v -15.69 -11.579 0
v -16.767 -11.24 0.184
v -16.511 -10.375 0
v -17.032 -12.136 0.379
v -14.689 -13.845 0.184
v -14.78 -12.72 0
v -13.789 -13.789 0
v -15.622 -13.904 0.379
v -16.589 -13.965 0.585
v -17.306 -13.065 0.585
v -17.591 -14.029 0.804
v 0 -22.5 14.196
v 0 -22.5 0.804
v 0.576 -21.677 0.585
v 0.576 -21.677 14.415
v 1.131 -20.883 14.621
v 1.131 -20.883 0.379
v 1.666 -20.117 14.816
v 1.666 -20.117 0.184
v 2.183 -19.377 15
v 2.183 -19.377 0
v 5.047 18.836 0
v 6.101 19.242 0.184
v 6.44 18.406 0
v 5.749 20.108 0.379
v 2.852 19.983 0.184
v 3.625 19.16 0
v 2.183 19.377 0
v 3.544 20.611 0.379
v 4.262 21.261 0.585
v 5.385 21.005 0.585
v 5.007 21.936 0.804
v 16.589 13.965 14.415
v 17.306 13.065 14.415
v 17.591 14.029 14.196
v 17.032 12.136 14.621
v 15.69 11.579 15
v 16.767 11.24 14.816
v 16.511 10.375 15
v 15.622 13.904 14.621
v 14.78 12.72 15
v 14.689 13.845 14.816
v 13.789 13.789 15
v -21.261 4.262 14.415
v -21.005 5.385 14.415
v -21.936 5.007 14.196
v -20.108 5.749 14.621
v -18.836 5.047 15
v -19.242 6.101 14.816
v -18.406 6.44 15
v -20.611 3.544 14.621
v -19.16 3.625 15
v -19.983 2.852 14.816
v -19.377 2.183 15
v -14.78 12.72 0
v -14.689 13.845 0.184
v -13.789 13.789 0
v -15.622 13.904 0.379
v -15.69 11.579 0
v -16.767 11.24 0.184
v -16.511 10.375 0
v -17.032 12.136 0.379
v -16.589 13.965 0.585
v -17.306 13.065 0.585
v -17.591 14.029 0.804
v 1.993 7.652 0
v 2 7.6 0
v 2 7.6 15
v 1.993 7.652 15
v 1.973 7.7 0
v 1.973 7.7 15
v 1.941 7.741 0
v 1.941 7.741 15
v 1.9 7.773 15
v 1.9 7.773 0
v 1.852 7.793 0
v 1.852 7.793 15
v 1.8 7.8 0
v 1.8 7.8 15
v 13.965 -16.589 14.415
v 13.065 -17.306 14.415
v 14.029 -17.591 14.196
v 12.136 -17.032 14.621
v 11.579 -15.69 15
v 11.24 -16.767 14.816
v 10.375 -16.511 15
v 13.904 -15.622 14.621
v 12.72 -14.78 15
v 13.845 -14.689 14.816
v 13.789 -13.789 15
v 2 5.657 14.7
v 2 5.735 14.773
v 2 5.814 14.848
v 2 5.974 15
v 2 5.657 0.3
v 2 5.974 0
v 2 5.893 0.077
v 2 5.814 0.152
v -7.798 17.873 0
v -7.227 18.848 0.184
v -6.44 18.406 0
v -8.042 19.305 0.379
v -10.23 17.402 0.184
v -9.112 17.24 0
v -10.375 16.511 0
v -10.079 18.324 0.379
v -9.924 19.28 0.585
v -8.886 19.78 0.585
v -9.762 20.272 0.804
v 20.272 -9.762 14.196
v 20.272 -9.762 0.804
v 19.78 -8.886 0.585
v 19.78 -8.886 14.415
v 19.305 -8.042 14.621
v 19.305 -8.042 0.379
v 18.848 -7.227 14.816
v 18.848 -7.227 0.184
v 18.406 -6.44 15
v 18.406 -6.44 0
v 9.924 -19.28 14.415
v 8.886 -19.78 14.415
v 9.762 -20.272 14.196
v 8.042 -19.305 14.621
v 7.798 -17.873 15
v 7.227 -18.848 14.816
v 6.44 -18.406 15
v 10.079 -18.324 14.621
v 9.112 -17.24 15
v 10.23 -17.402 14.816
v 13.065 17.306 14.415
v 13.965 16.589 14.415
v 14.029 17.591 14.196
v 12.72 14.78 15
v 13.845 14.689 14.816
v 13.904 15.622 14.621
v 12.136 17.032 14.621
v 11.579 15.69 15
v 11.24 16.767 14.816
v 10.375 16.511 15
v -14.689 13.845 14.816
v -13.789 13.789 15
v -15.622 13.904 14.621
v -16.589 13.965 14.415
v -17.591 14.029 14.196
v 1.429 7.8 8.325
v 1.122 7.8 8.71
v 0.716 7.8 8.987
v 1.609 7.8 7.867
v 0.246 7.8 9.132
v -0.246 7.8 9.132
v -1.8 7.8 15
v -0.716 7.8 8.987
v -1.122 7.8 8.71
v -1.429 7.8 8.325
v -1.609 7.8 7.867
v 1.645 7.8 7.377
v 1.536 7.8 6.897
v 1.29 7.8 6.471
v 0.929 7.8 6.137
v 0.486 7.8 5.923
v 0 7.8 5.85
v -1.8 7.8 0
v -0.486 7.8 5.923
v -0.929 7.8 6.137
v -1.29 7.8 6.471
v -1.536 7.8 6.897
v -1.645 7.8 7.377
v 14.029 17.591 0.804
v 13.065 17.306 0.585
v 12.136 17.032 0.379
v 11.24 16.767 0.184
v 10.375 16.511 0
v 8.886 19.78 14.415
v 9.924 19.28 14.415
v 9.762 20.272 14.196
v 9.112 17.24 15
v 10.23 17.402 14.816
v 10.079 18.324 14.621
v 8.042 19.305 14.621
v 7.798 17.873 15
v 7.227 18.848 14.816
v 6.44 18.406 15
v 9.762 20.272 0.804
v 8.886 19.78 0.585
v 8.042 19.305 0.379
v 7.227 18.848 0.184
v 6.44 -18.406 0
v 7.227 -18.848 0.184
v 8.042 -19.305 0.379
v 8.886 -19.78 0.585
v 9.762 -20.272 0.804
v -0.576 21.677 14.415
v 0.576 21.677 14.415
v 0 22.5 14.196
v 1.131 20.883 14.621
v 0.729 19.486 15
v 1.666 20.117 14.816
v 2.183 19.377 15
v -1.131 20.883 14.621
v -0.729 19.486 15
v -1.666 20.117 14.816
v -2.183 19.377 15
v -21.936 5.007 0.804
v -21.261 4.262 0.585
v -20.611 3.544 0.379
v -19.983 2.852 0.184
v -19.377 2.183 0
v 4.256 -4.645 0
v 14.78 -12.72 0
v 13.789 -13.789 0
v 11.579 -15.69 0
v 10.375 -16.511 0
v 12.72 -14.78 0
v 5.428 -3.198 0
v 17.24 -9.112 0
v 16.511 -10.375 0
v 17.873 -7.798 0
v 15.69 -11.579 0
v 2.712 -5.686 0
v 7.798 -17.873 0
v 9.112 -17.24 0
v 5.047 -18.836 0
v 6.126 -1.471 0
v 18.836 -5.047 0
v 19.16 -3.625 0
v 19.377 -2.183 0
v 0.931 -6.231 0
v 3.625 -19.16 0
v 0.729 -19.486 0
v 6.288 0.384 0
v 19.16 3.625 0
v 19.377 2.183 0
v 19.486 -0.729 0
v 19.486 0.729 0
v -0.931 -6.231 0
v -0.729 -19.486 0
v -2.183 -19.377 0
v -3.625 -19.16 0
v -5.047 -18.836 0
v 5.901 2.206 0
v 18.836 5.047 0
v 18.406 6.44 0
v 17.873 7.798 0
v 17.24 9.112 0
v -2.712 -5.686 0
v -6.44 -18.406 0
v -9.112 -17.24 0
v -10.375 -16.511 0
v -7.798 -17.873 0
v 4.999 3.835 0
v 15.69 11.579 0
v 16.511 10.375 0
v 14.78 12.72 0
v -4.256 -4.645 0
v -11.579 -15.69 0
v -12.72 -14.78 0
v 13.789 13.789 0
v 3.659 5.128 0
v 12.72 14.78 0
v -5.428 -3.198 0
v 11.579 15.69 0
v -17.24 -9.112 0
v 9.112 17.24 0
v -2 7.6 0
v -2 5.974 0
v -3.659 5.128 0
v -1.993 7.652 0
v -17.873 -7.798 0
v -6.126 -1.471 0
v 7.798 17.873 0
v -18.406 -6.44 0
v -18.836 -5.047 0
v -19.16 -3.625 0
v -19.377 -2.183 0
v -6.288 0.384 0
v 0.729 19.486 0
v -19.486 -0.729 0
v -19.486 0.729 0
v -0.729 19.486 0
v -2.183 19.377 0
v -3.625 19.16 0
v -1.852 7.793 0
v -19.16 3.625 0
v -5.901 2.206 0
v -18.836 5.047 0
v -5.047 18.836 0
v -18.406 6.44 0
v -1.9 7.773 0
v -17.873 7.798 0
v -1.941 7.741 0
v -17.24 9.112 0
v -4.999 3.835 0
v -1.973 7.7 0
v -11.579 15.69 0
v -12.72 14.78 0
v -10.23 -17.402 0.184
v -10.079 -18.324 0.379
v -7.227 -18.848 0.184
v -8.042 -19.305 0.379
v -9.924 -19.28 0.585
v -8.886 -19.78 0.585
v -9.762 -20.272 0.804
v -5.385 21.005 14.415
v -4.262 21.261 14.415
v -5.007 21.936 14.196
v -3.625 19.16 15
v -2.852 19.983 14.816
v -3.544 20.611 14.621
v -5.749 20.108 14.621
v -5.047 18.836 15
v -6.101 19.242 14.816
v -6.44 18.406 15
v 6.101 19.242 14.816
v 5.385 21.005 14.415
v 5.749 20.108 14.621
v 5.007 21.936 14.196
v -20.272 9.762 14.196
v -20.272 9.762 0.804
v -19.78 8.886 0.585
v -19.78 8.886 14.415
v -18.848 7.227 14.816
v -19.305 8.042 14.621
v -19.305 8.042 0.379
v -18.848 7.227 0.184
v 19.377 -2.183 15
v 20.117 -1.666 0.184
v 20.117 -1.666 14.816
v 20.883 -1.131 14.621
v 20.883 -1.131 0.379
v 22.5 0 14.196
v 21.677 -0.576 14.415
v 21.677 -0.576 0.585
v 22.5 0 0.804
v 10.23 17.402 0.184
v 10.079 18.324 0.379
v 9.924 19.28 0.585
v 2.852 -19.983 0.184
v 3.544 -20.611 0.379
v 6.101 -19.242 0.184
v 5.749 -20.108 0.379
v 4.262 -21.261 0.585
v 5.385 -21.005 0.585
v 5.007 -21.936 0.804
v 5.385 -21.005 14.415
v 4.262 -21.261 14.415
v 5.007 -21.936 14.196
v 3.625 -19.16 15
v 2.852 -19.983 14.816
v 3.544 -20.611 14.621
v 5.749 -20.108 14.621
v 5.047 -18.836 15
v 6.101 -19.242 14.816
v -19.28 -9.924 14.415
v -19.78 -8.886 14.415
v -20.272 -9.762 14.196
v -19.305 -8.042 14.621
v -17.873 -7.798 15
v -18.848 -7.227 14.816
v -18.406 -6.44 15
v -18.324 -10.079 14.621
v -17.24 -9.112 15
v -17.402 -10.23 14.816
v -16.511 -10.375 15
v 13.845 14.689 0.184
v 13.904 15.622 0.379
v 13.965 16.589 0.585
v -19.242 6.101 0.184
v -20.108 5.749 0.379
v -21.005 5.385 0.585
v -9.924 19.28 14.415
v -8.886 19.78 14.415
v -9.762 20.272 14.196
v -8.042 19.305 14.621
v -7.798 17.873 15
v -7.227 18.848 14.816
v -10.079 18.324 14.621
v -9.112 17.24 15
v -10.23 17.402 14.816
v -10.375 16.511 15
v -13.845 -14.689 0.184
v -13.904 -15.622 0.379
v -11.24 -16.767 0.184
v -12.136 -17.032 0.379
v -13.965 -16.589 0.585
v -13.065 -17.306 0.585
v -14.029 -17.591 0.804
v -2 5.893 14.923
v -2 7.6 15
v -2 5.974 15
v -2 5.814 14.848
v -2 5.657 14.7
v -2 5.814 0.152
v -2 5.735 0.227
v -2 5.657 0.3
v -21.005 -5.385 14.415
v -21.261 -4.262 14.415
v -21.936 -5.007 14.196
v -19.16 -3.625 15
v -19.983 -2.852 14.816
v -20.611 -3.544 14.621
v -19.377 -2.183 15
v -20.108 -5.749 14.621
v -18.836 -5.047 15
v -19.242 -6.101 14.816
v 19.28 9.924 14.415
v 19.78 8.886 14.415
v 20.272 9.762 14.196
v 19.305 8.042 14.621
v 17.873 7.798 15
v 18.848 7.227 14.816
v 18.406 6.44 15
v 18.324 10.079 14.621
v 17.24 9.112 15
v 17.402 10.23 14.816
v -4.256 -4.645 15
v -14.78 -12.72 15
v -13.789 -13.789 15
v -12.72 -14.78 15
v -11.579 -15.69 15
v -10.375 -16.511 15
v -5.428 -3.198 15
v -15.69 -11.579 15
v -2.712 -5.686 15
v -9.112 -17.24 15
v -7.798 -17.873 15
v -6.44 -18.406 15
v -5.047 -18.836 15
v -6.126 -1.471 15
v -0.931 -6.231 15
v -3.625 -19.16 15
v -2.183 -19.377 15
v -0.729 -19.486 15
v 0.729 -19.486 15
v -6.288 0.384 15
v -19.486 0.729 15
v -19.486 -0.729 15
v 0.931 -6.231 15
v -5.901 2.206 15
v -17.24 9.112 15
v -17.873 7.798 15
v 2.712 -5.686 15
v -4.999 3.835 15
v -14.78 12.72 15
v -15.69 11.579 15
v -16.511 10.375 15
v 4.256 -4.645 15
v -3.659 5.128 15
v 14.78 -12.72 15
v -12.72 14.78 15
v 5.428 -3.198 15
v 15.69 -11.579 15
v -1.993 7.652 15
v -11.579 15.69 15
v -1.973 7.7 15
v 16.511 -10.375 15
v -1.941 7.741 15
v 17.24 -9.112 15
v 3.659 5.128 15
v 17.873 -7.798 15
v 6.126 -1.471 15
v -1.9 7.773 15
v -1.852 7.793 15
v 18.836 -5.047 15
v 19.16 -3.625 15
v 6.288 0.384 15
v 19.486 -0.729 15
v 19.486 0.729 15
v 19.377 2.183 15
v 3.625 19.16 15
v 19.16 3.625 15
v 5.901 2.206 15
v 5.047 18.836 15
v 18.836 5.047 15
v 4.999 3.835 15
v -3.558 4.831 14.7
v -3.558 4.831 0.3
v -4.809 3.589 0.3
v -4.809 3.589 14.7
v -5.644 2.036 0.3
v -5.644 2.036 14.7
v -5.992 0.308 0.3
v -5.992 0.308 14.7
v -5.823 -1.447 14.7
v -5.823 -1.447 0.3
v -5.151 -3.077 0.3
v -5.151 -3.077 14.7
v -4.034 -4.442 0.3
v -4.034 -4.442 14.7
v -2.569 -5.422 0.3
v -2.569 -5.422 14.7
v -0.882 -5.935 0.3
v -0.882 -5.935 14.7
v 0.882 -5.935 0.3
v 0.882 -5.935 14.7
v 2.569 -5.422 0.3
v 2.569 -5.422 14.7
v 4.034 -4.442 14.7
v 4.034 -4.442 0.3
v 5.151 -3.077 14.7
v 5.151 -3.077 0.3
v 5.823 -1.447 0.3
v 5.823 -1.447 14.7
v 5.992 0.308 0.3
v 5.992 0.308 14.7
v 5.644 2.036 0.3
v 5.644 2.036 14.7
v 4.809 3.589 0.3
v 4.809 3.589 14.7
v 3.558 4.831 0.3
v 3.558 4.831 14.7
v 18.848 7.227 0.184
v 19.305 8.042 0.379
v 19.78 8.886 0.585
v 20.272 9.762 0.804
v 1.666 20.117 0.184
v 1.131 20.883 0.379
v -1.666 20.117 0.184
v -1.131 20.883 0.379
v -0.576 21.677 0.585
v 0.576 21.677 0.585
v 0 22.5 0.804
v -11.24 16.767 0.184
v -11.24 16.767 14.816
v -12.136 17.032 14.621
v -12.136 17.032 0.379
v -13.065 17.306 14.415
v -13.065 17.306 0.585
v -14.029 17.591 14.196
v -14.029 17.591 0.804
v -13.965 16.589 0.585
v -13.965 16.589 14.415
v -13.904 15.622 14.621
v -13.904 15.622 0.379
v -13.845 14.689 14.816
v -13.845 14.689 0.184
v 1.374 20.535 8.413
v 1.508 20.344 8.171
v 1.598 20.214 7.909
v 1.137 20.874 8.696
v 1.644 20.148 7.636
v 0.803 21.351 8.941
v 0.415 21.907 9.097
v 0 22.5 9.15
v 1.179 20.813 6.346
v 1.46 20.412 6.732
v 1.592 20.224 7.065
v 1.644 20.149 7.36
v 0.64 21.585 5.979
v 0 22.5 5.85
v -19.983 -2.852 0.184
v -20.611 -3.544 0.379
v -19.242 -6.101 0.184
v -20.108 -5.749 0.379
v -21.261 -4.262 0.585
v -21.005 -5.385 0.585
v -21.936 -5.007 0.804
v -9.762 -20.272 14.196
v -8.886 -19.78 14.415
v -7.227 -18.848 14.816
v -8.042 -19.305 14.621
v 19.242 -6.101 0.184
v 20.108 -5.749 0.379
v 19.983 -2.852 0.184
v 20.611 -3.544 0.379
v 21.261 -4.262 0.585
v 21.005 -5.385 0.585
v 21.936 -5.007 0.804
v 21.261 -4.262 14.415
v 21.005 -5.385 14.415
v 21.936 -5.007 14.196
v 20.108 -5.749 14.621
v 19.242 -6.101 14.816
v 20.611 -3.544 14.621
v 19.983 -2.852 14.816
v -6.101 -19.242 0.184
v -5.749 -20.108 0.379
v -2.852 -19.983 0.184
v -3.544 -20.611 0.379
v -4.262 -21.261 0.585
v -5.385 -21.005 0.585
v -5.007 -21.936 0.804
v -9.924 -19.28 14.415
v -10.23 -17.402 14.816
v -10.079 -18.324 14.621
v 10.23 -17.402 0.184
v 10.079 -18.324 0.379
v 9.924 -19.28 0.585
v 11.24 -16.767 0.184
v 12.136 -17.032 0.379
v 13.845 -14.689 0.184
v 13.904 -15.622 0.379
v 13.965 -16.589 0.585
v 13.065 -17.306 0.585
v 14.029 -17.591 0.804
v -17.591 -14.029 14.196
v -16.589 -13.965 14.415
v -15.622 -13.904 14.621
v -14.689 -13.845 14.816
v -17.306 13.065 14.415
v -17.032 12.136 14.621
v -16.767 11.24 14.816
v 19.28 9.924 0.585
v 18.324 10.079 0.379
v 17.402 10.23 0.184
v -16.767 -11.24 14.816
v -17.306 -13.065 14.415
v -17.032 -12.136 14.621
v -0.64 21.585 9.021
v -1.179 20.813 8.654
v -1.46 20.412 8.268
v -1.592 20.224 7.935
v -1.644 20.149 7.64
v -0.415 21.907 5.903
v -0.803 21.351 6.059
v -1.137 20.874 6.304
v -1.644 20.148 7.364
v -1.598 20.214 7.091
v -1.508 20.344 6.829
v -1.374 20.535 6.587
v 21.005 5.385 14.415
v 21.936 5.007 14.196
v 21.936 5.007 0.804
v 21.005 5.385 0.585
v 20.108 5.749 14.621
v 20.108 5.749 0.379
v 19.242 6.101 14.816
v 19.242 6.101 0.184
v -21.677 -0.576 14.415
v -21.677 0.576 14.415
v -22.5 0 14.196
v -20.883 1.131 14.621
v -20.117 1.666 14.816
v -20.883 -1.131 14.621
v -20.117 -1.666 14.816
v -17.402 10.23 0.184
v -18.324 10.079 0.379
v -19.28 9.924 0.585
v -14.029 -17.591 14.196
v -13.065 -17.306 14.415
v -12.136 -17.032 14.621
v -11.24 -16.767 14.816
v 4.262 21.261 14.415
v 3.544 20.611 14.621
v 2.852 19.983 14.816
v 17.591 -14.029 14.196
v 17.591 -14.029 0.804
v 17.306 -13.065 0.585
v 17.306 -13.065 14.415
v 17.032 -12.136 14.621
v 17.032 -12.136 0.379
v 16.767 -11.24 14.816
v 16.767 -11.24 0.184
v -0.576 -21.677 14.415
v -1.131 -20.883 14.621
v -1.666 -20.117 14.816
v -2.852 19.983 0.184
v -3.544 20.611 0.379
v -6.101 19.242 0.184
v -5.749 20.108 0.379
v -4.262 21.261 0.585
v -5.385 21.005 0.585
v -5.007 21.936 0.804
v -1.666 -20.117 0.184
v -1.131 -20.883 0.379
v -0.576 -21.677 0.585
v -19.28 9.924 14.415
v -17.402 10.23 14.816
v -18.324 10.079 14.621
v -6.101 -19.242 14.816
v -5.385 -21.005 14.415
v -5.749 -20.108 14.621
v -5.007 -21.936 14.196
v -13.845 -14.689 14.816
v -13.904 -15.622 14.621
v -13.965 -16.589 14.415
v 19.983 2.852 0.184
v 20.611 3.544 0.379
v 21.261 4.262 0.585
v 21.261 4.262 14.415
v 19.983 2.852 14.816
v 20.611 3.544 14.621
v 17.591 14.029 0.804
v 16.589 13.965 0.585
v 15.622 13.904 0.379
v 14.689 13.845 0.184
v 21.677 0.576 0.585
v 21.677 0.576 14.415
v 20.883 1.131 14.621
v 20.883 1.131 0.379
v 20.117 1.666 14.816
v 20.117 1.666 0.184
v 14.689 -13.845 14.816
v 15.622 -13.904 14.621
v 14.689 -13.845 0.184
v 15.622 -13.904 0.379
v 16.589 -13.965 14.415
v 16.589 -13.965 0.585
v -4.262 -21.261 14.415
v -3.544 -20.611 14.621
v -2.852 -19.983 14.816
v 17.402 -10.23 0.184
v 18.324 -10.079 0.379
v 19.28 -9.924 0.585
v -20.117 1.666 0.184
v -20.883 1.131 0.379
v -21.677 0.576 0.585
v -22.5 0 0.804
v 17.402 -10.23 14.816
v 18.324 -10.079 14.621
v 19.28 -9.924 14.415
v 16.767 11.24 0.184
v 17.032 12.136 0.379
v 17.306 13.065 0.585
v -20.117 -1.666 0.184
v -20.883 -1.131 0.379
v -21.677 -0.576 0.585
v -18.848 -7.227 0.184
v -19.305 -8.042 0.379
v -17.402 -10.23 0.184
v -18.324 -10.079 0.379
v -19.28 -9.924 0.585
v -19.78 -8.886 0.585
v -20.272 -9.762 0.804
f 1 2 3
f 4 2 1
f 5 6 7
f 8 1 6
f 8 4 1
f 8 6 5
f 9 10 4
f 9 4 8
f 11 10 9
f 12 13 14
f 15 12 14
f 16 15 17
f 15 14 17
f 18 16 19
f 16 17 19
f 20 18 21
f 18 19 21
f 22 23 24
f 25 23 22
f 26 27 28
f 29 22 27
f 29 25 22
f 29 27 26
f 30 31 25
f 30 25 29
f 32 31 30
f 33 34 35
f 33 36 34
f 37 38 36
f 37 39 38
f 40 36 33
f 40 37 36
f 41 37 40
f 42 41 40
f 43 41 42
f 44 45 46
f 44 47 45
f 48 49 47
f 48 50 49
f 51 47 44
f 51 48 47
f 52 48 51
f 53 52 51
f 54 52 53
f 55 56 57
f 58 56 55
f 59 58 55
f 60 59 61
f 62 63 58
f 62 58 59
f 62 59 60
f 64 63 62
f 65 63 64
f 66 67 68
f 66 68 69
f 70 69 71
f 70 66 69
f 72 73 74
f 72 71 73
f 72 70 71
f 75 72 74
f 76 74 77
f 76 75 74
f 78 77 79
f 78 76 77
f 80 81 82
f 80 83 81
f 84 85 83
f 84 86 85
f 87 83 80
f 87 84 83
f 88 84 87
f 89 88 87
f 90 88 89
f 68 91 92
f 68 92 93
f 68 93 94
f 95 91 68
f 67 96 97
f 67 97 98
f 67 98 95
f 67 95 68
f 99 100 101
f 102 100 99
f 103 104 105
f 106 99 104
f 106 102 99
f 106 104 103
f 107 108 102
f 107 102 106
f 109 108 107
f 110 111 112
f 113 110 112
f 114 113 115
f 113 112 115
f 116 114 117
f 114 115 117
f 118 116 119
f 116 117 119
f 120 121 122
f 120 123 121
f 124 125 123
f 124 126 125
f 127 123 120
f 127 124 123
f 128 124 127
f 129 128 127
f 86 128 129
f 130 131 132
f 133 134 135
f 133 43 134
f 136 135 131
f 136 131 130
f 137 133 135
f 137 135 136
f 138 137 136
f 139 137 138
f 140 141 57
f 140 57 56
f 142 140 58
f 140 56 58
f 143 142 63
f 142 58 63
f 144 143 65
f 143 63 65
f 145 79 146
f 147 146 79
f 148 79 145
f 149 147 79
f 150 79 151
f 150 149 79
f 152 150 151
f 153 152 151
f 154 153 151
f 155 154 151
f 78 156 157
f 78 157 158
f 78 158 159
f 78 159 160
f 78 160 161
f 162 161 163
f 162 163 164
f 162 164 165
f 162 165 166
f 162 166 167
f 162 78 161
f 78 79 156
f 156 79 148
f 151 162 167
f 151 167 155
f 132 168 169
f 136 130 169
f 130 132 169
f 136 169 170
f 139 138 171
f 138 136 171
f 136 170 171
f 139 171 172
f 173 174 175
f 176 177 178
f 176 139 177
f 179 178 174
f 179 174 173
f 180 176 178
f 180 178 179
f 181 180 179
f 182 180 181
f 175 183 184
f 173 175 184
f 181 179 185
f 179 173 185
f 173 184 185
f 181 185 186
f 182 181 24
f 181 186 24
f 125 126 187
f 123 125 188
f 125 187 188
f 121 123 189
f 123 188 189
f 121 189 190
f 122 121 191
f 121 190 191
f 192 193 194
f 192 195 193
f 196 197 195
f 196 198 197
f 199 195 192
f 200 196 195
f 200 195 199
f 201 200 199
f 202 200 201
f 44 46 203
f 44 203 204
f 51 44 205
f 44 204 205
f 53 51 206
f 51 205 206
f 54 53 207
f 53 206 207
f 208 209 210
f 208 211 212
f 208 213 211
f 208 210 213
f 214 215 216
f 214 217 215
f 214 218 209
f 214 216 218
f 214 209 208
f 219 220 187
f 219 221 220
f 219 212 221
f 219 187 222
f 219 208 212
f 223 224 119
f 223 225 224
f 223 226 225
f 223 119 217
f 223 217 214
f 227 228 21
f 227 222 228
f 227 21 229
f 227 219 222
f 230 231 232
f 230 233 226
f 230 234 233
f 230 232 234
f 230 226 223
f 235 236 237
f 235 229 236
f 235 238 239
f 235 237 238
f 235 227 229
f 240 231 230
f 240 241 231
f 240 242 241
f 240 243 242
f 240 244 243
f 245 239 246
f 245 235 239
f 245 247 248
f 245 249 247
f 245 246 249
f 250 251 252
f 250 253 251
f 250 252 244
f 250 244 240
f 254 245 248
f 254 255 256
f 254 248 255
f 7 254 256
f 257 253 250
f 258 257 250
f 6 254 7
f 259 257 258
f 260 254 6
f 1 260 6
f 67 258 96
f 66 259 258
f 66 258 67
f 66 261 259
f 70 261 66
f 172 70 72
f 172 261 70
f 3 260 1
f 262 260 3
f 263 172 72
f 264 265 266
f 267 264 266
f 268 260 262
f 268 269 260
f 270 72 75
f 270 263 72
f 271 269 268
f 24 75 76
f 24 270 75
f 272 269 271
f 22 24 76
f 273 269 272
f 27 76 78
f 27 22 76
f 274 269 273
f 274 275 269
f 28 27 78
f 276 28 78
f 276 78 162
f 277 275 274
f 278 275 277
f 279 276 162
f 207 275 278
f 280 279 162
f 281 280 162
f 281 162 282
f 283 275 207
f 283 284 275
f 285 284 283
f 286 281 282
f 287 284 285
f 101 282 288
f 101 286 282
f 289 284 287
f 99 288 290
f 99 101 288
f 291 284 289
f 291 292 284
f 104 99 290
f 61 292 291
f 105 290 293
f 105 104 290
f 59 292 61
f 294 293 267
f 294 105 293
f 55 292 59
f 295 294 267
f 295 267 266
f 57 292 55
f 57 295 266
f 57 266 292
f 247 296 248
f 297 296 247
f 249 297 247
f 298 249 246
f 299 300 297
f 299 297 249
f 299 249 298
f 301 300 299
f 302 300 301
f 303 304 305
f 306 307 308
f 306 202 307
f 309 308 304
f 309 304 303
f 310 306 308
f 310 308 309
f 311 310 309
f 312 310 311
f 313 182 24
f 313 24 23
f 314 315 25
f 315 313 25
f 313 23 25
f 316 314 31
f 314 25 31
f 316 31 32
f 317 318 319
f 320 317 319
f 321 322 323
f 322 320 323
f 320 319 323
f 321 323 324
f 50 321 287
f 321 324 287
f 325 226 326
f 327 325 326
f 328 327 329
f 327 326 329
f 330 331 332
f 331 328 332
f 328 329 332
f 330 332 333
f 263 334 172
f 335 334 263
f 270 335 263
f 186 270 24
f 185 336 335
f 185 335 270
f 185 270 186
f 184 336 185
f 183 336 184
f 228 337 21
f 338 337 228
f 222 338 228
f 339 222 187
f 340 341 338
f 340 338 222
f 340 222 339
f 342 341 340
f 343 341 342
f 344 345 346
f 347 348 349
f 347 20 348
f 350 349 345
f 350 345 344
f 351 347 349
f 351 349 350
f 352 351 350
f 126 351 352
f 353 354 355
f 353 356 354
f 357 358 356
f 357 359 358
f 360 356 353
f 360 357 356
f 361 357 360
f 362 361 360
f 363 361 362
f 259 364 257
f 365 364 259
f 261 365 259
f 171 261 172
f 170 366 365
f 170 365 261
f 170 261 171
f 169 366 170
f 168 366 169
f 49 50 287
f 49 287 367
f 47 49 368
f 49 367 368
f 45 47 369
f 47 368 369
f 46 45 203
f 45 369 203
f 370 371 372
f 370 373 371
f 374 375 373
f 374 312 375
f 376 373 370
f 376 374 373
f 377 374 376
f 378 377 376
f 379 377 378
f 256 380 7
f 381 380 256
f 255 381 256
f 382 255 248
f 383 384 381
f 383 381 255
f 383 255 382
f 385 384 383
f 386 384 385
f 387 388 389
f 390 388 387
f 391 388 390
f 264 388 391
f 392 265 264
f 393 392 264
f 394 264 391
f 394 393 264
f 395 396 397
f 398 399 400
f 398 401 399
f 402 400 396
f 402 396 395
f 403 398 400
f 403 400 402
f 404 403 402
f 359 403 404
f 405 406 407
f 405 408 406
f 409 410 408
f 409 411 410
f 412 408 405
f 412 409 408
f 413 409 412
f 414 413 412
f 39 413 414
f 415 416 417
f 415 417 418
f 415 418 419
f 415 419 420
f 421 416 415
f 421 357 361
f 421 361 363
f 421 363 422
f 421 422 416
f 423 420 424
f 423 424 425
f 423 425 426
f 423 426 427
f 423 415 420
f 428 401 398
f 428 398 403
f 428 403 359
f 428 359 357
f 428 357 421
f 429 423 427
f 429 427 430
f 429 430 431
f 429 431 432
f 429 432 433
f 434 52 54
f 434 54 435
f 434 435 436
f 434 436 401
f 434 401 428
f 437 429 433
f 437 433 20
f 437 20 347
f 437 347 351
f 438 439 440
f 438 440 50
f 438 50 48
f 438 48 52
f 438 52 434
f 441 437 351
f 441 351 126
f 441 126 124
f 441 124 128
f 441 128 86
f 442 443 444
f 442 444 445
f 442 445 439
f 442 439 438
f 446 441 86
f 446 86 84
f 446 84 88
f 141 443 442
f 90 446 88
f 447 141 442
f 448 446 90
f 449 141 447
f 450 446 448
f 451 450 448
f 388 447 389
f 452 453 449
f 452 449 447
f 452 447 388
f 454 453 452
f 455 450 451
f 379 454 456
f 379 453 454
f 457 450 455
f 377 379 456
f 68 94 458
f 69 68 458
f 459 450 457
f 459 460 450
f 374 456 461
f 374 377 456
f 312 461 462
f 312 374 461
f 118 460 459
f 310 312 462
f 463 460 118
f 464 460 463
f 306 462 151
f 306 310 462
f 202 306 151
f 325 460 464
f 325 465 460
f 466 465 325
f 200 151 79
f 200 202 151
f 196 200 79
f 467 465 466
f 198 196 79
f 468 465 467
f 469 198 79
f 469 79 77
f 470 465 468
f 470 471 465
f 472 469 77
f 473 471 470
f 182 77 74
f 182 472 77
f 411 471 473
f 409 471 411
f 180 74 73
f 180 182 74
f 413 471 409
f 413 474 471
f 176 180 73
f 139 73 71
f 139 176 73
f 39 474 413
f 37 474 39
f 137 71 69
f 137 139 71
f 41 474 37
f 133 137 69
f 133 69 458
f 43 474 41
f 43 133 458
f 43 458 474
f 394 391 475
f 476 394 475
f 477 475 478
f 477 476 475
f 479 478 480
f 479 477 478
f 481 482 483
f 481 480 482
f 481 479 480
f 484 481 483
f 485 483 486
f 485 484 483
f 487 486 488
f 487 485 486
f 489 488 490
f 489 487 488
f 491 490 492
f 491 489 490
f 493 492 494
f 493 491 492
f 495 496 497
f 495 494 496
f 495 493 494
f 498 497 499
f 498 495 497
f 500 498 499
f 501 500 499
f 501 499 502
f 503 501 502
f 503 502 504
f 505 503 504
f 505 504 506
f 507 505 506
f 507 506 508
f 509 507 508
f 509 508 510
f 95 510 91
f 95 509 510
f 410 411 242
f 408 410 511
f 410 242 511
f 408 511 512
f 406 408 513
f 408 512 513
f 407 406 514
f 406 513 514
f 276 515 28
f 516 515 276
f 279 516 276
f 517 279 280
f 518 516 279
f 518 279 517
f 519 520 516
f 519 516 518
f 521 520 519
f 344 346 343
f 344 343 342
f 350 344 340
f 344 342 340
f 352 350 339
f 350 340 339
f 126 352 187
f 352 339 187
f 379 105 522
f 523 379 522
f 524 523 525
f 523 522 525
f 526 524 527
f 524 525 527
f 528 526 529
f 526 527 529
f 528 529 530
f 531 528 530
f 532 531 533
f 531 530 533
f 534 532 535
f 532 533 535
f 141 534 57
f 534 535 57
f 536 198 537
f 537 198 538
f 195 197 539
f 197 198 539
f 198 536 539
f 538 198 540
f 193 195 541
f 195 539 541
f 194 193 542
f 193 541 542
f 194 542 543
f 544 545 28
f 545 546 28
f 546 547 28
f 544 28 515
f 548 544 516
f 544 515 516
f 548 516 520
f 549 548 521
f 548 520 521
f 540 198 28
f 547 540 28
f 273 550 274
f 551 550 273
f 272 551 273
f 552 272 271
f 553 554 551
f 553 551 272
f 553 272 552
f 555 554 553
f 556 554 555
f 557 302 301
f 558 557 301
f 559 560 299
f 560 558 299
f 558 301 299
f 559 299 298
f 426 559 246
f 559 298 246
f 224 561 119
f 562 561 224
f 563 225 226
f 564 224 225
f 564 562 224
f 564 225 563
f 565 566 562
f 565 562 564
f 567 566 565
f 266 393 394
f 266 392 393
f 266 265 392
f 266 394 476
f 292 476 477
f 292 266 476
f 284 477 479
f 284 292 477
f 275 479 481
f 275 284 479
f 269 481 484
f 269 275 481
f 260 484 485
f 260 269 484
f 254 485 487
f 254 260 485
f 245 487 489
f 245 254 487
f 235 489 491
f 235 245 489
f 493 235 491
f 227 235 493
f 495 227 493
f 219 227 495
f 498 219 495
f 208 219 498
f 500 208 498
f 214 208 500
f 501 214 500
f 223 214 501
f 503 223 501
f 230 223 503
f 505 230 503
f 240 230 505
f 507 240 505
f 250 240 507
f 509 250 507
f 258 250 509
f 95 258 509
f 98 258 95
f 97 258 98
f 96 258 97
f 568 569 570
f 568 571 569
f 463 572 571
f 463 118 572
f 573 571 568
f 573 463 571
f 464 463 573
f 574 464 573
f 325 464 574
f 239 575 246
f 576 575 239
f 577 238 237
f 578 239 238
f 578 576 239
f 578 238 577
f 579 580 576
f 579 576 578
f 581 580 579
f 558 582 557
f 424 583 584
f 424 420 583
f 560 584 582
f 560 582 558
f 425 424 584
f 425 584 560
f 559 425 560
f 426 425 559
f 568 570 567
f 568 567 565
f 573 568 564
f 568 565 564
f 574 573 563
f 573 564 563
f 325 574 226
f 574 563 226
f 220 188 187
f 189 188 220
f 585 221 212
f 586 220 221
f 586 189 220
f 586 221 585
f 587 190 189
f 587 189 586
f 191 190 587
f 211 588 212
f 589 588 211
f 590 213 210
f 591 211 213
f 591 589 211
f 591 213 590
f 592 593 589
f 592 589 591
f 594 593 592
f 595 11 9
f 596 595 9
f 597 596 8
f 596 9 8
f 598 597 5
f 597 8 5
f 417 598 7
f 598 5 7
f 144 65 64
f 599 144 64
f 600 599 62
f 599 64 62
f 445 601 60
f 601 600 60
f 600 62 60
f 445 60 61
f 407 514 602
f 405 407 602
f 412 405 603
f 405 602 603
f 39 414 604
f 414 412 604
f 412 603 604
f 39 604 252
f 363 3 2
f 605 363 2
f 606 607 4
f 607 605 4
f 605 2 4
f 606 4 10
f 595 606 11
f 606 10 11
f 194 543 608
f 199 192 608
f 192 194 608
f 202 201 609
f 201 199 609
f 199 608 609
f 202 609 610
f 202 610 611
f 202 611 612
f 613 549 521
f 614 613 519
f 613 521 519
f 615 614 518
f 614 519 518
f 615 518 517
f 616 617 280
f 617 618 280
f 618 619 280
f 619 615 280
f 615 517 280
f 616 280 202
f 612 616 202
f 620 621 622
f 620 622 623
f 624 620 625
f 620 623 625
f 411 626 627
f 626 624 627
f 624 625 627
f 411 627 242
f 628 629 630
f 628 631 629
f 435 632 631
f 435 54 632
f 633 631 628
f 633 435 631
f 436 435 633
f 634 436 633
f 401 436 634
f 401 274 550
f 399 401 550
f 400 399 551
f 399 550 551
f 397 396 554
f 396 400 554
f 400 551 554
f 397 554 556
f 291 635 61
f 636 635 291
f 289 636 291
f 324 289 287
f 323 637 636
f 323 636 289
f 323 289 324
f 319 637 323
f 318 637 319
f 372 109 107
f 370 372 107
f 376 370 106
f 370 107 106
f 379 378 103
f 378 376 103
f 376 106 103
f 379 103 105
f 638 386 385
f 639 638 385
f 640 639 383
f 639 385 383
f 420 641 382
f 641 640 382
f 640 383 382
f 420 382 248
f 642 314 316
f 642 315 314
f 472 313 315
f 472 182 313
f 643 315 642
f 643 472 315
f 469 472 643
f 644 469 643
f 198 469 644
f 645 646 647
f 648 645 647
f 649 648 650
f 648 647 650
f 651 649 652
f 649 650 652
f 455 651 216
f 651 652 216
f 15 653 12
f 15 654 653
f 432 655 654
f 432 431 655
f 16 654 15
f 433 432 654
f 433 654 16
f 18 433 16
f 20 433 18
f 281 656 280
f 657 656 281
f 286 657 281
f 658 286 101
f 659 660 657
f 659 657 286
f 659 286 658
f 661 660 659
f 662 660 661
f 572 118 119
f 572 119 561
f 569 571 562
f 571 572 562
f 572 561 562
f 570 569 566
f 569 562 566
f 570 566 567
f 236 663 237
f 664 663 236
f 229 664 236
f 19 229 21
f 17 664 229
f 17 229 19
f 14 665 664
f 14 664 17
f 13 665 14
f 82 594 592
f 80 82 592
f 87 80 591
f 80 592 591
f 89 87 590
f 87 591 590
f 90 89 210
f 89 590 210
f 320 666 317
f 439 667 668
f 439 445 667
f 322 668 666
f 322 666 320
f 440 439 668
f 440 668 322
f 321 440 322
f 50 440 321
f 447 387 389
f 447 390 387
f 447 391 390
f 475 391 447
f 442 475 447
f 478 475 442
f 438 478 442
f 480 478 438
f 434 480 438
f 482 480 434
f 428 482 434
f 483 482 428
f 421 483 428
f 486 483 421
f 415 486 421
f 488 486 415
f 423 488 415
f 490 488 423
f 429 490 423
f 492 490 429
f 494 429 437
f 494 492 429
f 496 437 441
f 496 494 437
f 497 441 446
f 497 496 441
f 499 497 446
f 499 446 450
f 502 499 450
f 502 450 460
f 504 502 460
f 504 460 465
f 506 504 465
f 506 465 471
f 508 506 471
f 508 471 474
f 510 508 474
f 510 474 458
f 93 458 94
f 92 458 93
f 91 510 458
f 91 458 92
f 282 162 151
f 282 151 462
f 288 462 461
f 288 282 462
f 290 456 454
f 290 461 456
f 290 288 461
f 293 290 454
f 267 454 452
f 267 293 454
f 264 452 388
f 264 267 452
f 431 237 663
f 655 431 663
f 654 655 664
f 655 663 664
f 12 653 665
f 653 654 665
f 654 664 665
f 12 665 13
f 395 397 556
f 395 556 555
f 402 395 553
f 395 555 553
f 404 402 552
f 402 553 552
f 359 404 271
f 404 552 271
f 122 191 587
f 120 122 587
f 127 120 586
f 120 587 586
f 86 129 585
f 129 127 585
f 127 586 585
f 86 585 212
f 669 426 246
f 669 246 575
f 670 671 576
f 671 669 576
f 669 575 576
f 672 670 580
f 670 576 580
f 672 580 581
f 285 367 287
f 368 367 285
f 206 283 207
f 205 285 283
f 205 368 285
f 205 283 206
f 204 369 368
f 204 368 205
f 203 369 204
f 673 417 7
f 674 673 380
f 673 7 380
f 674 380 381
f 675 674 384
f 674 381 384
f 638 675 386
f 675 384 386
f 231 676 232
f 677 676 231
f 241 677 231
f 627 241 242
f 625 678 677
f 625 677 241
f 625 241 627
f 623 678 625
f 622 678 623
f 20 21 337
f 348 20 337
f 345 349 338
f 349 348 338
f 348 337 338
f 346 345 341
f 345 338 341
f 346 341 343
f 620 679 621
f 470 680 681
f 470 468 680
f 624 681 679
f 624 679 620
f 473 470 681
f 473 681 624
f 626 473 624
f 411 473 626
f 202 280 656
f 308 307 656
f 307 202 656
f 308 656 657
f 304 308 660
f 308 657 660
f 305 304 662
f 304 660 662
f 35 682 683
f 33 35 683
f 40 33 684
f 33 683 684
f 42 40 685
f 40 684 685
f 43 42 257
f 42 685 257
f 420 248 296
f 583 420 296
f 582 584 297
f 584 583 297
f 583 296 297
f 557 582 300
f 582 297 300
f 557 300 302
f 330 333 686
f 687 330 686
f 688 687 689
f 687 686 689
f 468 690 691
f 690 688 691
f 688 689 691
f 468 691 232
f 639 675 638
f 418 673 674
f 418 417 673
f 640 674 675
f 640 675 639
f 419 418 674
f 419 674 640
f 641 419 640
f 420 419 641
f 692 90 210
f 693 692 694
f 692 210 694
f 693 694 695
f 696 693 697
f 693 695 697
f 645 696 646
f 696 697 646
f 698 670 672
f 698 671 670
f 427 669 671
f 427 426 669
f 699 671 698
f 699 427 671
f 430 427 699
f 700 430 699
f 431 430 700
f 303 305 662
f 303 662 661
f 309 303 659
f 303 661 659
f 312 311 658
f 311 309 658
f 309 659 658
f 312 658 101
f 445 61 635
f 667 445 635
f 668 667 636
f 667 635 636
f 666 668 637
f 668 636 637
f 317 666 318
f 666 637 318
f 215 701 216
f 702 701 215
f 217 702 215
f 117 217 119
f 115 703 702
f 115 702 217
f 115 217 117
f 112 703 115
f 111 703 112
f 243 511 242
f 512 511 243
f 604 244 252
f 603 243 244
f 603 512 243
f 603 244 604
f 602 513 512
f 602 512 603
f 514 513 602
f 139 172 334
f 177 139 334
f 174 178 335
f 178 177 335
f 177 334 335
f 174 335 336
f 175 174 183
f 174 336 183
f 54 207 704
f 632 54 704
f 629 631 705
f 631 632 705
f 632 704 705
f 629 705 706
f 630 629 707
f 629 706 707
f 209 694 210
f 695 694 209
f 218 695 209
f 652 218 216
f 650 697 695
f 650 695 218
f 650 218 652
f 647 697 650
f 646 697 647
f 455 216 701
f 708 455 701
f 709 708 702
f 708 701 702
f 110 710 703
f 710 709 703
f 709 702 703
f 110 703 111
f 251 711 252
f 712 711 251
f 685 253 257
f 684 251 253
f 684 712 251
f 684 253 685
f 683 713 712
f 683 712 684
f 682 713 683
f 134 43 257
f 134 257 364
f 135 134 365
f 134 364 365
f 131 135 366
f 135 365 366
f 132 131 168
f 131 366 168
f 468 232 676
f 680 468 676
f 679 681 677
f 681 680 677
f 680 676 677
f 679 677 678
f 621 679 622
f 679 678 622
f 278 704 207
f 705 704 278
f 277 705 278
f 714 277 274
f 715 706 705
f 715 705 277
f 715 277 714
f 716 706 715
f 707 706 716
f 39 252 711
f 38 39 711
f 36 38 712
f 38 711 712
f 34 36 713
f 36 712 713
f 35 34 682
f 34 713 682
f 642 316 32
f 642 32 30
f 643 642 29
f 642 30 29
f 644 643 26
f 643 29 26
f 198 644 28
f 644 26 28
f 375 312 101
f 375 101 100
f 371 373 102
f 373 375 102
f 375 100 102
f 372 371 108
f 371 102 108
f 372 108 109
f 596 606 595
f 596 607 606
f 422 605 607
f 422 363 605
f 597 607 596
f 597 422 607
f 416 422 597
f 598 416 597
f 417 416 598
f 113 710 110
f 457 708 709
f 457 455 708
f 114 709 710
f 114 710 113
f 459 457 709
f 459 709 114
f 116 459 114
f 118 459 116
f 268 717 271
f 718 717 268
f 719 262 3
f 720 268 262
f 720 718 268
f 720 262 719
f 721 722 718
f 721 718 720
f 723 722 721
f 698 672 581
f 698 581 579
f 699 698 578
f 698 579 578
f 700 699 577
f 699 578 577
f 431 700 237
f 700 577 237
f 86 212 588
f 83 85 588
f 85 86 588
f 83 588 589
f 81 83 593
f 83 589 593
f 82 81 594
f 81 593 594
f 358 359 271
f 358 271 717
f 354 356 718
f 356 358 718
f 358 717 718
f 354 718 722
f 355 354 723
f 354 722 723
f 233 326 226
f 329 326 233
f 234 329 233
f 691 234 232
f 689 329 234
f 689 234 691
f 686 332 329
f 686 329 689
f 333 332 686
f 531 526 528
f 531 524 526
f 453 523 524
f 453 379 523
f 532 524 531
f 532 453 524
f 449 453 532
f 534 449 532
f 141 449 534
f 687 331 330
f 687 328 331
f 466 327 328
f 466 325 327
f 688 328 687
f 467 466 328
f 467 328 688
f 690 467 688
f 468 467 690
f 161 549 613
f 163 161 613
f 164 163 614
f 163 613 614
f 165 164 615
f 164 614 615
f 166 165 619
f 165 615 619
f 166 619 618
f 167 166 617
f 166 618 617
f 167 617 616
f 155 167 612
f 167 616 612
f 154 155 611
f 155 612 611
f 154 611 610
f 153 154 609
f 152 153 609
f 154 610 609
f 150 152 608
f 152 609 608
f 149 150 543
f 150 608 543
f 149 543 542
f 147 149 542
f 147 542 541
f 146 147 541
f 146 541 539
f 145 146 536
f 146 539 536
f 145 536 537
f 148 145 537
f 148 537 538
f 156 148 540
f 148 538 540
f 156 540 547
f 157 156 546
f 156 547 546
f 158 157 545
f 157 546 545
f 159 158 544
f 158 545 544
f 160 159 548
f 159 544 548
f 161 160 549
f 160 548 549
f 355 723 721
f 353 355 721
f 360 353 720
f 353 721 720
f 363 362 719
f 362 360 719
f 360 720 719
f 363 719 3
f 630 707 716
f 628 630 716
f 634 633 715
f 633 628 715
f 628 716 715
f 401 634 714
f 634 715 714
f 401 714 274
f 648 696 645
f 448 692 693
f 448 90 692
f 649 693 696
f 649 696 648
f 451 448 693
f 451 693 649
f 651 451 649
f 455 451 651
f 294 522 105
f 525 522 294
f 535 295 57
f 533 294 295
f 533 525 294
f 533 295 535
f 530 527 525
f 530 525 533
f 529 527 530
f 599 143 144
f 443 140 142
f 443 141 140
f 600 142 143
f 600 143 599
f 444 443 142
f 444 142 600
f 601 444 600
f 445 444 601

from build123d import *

# Parameters (mm, degrees)
SKETCH_2_R          = 45
CUT_EXTRUDE_1_DEPTH = 15
CUT_EXTRUDE_2_DEPTH = 27
SKETCH_4_W          = 1.65
SKETCH_4_H          = 14.7


with BuildPart() as part:
    # 草图1 → 旋转1 (revolve)
    with BuildSketch(Plane(origin=(0, 0, 0), x_dir=(0, 0, -1), z_dir=(1, 0, 0))):
        Polygon((-15, 19.5), (-15, 6.3), (-14.7, 6), (-0.3, 6), (0, 6.3), (0, 19.5), (-0.803847577, 22.5), (-14.196152423, 22.5), align=None)
    revolve(axis=Axis((0, 0, 0), (0, 0, 1)))

    # 草图2 → 切除-拉伸1 (cut)
    with BuildSketch(Plane.XY):
        Circle(SKETCH_2_R)
        Polygon((-22.5, 0), (-19.377388093, -2.183307284), (-21.935878024, -5.006721014), (-18.405724941, -6.440441708), (-20.271799528, -9.76238413), (-16.511121885, -10.374625492), (-17.591208356, -14.028520542), (-13.788582233, -13.788582233), (-14.028520542, -17.591208356), (-10.374625492, -16.511121885), (-9.76238413, -20.271799528), (-6.440441708, -18.405724941), (-5.006721014, -21.935878024), (-2.183307284, -19.377388093), (0, -22.5), (2.183307284, -19.377388093), (5.006721014, -21.935878024), (6.440441708, -18.405724941), (9.76238413, -20.271799528), (10.374625492, -16.511121885), (14.028520542, -17.591208356), (13.788582233, -13.788582233), (17.591208356, -14.028520542), (16.511121885, -10.374625492), (20.271799528, -9.76238413), (18.405724941, -6.440441708), (21.935878024, -5.006721014), (19.377388093, -2.183307284), (22.5, 0), (19.377388093, 2.183307284), (21.935878024, 5.006721014), (18.405724941, 6.440441708), (20.271799528, 9.76238413), (16.511121885, 10.374625492), (17.591208356, 14.028520542), (13.788582233, 13.788582233), (14.028520542, 17.591208356), (10.374625492, 16.511121885), (9.76238413, 20.271799528), (6.440441708, 18.405724941), (5.006721014, 21.935878024), (2.183307284, 19.377388093), (0, 22.5), (-2.183307284, 19.377388093), (-5.006721014, 21.935878024), (-6.440441708, 18.405724941), (-9.76238413, 20.271799528), (-10.374625492, 16.511121885), (-14.028520542, 17.591208356), (-13.788582233, 13.788582233), (-17.591208356, 14.028520542), (-16.511121885, 10.374625492), (-20.271799528, 9.76238413), (-18.405724941, 6.440441708), (-21.935878024, 5.006721014), (-19.377388093, 2.183307284), align=None, mode=Mode.SUBTRACT)
    extrude(amount=CUT_EXTRUDE_1_DEPTH, mode=Mode.SUBTRACT)

    # 草图3 → 切除-拉伸2 (cut)
    with BuildSketch(Plane.XY):
        with BuildLine():
            Line((-2, 0), (2, 0))
            Line((2, 0), (2, 7.6))
            ThreePointArc((2, 7.6), (1.941421356, 7.741421356), (1.8, 7.8))
            Line((1.8, 7.8), (-1.8, 7.8))
            ThreePointArc((-1.8, 7.8), (-1.941421356, 7.741421356), (-2, 7.6))
            Line((-2, 7.6), (-2, 0))
        make_face()
    extrude(amount=CUT_EXTRUDE_2_DEPTH, mode=Mode.SUBTRACT)

    # 草图4 → M4 螺纹孔1 (revolve, cut)
    with BuildSketch(Plane(origin=(0, 7.8, 7.5), x_dir=(0, 0, -1), z_dir=(1, 0, 0))):
        with Locations((0.825, 7.35)):
            Rectangle(SKETCH_4_W, SKETCH_4_H)
    revolve(axis=Axis((0, 1.45, 7.5), (0, 1, 0)), mode=Mode.SUBTRACT)


solid = part.part
